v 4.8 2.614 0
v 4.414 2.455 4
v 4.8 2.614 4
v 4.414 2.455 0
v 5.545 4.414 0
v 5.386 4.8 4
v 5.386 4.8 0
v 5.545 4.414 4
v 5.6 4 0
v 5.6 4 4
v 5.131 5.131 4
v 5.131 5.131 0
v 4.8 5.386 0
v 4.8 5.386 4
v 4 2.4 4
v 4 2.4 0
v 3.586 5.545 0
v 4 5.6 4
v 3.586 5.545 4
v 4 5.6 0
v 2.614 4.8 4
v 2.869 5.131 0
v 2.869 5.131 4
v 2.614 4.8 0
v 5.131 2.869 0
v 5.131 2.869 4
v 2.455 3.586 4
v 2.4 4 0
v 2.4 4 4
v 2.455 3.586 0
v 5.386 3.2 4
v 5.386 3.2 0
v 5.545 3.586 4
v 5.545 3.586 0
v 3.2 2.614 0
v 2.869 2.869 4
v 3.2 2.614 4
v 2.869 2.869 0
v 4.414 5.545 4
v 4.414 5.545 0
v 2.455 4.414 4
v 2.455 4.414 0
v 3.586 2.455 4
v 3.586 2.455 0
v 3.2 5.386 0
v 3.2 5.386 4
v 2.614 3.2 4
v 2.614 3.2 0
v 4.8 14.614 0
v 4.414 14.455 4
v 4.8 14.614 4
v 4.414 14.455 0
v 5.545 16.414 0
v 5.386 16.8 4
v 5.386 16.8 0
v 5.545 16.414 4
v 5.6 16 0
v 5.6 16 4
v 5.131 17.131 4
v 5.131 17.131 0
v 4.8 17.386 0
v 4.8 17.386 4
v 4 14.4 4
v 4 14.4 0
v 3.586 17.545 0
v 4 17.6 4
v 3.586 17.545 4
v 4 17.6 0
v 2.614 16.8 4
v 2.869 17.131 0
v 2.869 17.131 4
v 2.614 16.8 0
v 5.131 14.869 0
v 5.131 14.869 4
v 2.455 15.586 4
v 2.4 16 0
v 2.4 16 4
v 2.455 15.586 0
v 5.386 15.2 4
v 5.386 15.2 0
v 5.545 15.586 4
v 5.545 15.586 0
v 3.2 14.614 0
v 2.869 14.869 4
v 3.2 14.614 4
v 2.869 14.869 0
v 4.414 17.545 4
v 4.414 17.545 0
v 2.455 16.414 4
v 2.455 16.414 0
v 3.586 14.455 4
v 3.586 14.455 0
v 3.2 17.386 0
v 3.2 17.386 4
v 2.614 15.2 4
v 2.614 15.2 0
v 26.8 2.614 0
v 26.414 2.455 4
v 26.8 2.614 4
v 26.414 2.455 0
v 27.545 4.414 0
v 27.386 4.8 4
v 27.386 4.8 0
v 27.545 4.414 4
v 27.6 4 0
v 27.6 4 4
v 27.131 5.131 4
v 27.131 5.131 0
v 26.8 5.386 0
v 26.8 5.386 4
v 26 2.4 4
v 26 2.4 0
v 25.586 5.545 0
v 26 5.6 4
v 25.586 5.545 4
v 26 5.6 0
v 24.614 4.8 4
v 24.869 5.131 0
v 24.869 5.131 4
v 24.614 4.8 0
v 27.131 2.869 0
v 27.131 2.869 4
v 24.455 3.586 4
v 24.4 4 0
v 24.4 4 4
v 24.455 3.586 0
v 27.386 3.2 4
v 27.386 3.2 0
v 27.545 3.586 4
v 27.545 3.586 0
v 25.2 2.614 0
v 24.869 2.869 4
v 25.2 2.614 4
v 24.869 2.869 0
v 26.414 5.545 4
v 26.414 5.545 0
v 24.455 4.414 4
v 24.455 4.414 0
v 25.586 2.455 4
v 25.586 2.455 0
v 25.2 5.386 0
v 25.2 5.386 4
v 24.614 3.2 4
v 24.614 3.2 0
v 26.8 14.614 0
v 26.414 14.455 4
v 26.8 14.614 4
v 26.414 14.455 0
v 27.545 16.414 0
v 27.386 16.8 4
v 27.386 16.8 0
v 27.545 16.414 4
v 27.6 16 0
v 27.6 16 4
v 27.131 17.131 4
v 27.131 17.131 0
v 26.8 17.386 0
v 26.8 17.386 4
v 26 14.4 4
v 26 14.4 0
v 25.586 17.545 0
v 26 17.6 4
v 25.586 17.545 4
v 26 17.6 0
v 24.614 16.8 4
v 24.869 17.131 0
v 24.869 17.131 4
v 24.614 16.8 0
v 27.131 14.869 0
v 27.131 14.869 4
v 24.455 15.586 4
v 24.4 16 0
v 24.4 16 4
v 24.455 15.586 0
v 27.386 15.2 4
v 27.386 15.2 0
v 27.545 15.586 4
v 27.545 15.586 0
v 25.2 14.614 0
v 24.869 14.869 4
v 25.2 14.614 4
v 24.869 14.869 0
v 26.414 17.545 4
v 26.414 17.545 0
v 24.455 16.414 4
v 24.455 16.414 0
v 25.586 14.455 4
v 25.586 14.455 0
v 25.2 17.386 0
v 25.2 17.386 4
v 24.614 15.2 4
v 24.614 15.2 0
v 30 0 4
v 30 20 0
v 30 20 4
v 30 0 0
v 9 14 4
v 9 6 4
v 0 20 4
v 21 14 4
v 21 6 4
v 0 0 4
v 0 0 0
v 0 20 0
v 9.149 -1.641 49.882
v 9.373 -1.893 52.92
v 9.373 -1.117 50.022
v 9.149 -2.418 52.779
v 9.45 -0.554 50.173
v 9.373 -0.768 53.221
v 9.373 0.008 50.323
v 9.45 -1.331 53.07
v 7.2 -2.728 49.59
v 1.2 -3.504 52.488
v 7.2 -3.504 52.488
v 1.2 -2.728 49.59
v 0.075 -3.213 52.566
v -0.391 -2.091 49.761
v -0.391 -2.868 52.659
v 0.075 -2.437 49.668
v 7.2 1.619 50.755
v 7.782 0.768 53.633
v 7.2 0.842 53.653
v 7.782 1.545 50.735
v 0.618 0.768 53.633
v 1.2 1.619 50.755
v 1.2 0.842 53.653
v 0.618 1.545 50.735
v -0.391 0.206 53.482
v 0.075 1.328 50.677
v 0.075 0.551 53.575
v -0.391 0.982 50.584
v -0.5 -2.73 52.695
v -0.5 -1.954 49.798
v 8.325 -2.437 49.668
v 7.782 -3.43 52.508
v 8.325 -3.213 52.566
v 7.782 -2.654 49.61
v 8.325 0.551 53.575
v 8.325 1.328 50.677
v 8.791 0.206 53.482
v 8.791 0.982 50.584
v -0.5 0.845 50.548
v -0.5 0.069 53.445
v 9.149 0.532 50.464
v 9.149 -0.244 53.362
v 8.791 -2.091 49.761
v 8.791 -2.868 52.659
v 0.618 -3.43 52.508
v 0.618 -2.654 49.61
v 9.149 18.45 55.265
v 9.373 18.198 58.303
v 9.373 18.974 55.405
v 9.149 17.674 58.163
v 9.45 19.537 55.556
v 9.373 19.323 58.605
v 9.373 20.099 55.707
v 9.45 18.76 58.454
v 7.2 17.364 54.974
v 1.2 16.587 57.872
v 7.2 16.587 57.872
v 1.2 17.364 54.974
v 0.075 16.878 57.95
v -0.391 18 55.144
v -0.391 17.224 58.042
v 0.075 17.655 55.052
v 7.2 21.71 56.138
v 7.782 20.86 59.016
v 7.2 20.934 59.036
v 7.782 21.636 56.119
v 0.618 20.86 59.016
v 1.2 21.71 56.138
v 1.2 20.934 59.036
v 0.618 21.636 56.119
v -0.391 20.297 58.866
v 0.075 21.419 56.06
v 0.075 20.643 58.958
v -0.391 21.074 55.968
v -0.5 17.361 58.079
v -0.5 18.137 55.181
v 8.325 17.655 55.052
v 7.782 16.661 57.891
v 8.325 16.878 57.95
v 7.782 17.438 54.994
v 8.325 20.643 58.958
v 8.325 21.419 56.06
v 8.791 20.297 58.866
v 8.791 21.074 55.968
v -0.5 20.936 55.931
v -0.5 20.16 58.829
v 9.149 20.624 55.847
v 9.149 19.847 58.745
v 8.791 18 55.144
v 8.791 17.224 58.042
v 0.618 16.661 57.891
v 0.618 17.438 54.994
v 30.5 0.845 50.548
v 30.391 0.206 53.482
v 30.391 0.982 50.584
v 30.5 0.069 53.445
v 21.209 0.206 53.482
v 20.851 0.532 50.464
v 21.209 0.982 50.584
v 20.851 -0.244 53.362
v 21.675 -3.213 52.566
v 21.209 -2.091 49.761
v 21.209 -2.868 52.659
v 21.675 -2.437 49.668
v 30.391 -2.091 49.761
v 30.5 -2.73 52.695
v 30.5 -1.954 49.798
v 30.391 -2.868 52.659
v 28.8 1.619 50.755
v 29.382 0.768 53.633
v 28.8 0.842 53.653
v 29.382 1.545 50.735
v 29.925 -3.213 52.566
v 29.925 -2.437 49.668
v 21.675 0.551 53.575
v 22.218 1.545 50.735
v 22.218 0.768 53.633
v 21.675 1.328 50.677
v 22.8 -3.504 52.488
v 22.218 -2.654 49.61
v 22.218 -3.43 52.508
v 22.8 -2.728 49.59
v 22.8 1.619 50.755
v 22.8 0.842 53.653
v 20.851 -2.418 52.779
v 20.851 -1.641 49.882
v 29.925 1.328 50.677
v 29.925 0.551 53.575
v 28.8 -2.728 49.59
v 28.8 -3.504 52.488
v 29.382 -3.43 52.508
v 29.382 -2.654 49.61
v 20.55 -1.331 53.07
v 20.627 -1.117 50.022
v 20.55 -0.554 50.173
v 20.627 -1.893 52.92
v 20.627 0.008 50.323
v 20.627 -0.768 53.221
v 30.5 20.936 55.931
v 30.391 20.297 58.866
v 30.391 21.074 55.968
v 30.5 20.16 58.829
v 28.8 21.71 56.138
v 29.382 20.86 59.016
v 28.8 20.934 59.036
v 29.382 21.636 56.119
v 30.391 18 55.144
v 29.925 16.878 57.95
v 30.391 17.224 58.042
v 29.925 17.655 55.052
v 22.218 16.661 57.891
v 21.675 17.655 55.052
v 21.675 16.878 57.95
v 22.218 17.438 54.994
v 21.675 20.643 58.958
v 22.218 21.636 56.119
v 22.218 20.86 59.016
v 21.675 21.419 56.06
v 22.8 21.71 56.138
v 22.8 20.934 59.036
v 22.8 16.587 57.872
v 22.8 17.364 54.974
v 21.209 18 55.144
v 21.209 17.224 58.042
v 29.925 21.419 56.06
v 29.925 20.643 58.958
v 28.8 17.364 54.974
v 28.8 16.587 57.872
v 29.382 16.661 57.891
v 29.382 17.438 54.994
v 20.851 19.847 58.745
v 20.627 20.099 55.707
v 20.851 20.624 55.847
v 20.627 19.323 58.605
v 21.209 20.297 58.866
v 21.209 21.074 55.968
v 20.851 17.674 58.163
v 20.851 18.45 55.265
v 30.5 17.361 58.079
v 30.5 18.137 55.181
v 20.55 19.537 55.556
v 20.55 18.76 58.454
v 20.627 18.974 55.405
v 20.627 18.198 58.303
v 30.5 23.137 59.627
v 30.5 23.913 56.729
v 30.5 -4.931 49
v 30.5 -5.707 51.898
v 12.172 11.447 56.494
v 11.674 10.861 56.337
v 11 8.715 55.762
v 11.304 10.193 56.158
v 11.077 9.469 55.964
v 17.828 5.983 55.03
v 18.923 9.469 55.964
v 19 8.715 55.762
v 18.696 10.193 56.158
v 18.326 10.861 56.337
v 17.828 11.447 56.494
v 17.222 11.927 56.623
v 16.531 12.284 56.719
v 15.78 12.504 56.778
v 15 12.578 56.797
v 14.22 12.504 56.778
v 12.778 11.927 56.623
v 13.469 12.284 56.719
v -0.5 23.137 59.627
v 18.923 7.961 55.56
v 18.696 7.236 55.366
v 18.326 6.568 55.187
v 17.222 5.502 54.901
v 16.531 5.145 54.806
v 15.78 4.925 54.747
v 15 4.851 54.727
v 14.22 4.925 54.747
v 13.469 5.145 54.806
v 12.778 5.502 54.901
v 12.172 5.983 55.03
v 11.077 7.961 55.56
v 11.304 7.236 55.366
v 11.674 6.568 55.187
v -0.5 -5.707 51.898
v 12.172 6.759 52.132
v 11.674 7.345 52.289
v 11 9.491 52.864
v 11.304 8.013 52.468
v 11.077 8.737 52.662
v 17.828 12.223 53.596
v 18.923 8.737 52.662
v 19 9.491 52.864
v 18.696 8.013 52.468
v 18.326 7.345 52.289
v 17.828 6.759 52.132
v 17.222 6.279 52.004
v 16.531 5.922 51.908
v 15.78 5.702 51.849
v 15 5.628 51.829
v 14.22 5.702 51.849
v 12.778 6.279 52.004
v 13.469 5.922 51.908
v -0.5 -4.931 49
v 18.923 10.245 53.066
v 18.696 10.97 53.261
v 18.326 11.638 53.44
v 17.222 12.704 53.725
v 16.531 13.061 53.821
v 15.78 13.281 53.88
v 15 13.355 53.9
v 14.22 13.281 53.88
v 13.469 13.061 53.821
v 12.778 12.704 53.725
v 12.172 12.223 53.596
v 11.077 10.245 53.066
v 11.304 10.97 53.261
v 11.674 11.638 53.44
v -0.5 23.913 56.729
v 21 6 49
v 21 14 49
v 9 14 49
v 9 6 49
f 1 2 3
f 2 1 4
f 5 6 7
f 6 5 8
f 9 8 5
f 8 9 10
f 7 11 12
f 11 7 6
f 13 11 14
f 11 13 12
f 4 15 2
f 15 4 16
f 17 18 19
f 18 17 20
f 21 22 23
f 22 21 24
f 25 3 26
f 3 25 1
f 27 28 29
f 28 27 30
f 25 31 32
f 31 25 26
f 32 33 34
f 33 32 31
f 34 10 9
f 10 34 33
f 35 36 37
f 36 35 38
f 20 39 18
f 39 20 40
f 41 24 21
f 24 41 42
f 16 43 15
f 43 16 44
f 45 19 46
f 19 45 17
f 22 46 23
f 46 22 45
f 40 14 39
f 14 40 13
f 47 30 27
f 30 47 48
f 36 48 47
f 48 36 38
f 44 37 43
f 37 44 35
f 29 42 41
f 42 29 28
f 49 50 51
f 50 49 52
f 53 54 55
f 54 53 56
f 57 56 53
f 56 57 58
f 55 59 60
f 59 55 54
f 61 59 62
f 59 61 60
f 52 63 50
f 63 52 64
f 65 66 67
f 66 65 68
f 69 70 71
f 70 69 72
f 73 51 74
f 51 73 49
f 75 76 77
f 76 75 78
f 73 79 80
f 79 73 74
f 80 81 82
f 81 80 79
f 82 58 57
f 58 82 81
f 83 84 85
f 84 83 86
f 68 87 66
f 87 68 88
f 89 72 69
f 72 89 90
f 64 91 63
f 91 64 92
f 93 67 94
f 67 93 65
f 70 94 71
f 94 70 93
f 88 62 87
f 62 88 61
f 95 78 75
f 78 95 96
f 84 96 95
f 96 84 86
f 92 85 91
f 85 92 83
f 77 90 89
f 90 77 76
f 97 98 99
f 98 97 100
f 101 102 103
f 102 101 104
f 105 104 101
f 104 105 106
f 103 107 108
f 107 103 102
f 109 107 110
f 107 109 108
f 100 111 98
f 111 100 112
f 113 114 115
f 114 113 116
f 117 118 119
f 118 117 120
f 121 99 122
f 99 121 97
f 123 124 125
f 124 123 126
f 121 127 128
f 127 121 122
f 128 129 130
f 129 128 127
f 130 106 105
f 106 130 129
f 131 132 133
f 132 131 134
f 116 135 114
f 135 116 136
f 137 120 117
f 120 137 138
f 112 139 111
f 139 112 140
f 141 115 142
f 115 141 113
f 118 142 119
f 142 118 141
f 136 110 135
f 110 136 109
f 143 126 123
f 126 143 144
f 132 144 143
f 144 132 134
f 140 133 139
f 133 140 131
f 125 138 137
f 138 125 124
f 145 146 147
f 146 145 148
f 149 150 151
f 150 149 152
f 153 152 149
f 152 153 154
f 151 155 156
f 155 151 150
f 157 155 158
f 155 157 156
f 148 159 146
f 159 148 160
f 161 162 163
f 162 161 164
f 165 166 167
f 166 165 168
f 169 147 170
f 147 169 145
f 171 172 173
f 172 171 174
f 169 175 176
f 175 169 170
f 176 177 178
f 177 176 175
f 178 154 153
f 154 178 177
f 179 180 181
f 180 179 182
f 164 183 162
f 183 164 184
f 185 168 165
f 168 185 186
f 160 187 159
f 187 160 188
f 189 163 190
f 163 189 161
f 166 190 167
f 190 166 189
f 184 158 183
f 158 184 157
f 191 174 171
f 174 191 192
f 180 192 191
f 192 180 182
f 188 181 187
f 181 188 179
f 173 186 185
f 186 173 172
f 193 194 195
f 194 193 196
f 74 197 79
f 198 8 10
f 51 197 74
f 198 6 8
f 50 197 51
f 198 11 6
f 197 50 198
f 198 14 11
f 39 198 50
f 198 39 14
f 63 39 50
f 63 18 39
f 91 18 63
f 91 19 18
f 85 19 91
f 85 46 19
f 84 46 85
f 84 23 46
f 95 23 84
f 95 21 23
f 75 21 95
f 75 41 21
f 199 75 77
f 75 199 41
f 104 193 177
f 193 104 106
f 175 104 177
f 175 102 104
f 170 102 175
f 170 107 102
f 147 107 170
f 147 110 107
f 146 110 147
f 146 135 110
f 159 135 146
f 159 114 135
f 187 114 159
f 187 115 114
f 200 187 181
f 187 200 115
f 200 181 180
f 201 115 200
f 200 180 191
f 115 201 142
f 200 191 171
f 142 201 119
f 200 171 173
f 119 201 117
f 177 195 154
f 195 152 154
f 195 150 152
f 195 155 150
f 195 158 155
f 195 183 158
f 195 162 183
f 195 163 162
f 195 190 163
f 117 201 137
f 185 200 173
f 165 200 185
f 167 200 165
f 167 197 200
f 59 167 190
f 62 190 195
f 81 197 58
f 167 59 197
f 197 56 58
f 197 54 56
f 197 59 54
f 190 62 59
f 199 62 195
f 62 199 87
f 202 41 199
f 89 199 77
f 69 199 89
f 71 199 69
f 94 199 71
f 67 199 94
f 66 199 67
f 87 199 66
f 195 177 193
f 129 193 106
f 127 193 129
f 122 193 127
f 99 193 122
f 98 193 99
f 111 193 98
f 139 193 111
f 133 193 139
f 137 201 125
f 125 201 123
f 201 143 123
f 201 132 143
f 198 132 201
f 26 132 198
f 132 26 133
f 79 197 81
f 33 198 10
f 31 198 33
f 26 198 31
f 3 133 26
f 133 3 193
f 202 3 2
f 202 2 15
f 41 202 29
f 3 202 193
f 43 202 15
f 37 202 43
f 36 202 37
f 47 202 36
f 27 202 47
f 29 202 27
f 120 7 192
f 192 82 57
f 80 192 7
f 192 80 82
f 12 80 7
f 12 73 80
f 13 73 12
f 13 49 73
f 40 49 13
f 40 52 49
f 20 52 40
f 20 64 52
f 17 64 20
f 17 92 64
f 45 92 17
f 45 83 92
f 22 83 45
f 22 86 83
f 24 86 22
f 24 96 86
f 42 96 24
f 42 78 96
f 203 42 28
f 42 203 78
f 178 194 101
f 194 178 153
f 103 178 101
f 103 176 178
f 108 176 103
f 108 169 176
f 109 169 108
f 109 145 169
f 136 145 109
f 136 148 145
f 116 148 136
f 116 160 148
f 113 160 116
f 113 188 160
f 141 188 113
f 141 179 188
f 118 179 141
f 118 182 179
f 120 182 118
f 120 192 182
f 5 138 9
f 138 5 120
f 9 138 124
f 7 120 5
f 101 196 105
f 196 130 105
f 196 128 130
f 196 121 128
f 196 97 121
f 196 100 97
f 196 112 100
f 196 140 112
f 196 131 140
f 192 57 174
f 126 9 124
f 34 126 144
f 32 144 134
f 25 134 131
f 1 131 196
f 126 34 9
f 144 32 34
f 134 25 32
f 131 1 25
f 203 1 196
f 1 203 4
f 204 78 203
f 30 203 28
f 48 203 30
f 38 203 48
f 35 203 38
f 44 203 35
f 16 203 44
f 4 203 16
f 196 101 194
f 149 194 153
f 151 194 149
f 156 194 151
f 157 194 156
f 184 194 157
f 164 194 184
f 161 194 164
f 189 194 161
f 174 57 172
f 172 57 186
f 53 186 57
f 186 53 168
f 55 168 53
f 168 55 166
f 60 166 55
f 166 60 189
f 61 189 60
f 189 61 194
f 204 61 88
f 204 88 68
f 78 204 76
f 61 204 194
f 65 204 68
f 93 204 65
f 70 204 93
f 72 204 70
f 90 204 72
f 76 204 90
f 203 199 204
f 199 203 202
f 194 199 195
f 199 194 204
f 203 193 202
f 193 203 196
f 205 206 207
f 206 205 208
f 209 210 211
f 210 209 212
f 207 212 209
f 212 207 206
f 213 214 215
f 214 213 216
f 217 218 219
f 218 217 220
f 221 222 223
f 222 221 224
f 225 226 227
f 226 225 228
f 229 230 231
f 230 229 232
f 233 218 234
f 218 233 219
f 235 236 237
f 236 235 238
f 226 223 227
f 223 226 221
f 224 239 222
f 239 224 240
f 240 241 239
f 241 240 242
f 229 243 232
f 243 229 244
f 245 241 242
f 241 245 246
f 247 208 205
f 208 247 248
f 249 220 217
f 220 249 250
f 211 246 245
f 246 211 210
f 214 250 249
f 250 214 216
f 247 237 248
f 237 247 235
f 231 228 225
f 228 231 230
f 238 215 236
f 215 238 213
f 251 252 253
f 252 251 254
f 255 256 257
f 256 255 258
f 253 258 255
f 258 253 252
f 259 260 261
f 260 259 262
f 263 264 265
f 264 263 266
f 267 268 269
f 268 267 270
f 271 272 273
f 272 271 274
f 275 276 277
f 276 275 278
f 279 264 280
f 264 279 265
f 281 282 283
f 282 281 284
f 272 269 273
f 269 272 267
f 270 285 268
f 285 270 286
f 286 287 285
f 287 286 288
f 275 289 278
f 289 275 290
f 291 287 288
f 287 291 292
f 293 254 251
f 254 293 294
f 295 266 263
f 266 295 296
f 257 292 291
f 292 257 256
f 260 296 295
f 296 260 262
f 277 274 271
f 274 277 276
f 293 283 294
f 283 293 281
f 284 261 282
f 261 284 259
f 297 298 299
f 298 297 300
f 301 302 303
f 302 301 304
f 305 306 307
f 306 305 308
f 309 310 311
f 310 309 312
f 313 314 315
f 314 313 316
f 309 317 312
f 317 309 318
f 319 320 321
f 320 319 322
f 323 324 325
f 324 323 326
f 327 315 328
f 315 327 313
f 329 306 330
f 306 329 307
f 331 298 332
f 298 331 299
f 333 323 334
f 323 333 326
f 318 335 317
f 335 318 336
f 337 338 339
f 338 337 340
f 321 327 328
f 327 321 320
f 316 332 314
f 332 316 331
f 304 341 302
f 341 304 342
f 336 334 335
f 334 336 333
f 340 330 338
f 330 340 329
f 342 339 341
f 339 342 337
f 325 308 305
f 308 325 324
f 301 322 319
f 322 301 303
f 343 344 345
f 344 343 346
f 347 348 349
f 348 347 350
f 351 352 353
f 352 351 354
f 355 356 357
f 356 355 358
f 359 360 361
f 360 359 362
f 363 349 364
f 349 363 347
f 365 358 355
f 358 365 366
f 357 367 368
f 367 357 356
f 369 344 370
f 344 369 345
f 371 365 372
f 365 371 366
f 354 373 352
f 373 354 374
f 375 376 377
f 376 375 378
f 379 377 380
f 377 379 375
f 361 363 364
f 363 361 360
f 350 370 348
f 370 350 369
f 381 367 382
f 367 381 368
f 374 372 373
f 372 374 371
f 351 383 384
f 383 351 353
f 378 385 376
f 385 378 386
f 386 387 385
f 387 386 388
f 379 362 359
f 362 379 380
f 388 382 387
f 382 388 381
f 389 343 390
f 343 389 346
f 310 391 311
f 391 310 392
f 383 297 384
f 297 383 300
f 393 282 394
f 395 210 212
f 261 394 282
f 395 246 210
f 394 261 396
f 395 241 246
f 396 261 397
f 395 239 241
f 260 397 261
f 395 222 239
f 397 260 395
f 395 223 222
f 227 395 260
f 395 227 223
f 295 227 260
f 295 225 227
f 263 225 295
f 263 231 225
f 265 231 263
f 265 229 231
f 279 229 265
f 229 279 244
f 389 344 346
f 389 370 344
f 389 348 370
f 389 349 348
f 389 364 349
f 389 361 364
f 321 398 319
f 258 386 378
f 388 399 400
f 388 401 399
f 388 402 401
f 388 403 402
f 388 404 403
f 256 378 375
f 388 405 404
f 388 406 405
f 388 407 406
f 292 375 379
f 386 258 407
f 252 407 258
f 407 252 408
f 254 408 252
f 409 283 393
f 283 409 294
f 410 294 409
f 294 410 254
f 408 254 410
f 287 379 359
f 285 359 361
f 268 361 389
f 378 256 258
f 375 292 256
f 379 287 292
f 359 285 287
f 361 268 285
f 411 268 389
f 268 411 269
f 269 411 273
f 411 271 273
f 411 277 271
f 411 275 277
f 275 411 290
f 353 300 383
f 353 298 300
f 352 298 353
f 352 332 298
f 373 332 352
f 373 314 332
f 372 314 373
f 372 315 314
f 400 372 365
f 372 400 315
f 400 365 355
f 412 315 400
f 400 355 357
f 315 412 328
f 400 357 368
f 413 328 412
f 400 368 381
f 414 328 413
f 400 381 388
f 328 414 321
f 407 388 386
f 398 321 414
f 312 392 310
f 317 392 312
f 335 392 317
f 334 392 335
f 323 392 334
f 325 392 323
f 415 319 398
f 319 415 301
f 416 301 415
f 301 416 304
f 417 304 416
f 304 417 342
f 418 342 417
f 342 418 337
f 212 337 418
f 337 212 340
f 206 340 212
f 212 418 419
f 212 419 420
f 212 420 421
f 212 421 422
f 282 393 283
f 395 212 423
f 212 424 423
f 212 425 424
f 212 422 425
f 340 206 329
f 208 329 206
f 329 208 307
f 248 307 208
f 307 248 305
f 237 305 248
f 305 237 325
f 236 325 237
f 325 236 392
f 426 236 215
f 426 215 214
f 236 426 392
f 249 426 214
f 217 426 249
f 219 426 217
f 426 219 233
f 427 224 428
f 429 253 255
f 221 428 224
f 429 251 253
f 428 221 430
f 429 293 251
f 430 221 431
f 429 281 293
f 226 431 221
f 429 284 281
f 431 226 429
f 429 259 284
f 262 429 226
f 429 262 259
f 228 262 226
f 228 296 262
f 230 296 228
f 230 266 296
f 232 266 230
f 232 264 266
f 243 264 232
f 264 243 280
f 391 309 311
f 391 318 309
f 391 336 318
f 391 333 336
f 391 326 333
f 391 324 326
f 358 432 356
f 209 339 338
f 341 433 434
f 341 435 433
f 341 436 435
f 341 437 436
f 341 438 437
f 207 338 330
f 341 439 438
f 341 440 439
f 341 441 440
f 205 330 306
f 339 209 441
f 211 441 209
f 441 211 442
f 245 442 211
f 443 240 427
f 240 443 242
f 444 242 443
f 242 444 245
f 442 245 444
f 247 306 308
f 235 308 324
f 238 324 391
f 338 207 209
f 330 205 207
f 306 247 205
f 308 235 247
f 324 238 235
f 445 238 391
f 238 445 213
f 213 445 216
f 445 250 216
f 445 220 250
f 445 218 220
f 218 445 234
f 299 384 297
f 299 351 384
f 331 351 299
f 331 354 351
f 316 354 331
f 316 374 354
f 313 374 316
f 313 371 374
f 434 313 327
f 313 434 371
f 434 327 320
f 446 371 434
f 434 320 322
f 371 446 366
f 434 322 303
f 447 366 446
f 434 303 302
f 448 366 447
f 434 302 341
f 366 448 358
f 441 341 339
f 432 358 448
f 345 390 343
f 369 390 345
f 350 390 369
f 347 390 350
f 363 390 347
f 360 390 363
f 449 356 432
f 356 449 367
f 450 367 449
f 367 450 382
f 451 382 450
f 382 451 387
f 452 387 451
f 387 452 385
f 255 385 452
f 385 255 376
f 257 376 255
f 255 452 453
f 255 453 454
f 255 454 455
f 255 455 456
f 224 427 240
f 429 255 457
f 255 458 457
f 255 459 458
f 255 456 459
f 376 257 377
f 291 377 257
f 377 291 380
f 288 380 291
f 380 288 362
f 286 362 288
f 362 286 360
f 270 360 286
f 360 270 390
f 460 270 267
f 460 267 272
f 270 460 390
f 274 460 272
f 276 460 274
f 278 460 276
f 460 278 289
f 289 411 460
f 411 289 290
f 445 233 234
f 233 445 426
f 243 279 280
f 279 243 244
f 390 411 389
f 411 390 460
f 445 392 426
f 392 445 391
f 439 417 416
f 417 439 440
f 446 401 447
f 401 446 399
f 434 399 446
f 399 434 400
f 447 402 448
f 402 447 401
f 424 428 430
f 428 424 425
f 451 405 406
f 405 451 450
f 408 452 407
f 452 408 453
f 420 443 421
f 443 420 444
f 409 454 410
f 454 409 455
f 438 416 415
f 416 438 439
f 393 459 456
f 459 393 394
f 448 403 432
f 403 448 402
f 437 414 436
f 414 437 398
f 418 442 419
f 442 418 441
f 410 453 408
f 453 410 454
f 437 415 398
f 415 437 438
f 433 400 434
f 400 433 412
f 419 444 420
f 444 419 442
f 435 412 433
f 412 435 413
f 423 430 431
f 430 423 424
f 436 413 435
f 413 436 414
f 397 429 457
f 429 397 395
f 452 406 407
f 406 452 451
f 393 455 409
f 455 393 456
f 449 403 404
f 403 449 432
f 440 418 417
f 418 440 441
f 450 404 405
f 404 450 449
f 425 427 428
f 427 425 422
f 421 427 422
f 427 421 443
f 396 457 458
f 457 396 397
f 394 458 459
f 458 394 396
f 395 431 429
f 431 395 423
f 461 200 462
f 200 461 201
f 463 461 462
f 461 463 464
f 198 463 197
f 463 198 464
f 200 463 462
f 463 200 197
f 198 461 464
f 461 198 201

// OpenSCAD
/*
 * Camera mount for Raspberry Pi Camera Module 3, for the NITROUS chassis
 * (models/Print-01_DKS-Pro_DukeDoks_Main-body_One-piece-Body).
 *
 * The original NITROUS model has no camera bracket at all -- the author
 * built it as a manual RC car with a custom ESP32 board, no camera. This
 * is a fresh design, not adapted from any external source.
 *
 * Camera board dimensions and hole pattern are read directly from the
 * official Raspberry Pi mechanical drawing (see doc comment below), not
 * guessed. Because reading exact hole-to-hole pitch off a technical PDF
 * without the physical board in hand carries some risk of a small error,
 * this design uses SLOTS instead of tight-fit holes for the camera board
 * mounting screws -- a few mm of horizontal slack means a misread pitch of
 * 1-2mm won't make the part useless, whereas a precise round hole would.
 *
 * Source of dimensions: official Raspberry Pi Camera Module 3 Standard
 * mechanical drawing, https://datasheets.raspberrypi.com/camera/camera-module-3-standard-mechanical-drawing.pdf
 * Board envelope: 25 x 23.862mm. Mounting holes: 4x diameter 2.2mm on
 * ~21.6mm x ~20.8mm pitch (read off the drawing; verify against your
 * physical unit before drilling any TIGHT-fit hole pattern -- the slots
 * below are deliberately oversized for this reason).
 *
 * STATUS: NOT COMPILED. No OpenSCAD installation was available in this
 * environment (chocolatey install failed on a permissions/lock error, and
 * installing software system-wide without confirmation felt like the
 * wrong call for a throwaway CAD check). Written carefully with only
 * basic primitives (cube/cylinder/translate/rotate/difference/union) that
 * are unlikely to have syntax errors, but treat this as a first draft:
 * OPEN IT IN OPENSCAD AND VISUALLY CHECK BEFORE SLICING/PRINTING.
 * See roadmap issue #3.
 */

// ---- Parameters (all mm) ----

// Camera board (official RPi Camera Module 3 drawing)
cam_board_x = 25;
cam_board_y = 23.862;
cam_board_thickness = 1.5;     // PCB thickness, approximate
cam_hole_dia = 2.2;            // mounting hole diameter on the board
cam_slot_width = 4.5;          // oversized slot width for tolerance
cam_slot_length = 6;           // slot length (horizontal play)
cam_hole_pitch_x = 21.6;       // approx horizontal hole-to-hole spacing
cam_hole_pitch_y = 20.8;       // approx vertical hole-to-hole spacing
cam_lens_hole_dia = 8;         // clearance hole behind the lens (>5.75mm pad)

// Mounting post (attaches to the chassis top, e.g. near
// Print-10_Central-Axis or Print-11_Bridge -- the tallest existing part
// is 61mm, this post is deliberately independent of that so it can be
// glued/screwed wherever the assembled chassis has clearance)
post_height = 45;
post_width = 12;
post_depth = 8;

// Base plate that sits on the chassis and gets screwed/glued down
base_x = 30;
base_y = 20;
base_thickness = 4;
base_screw_hole_dia = 3.2;     // for M3 self-tapping screws into the chassis
base_screw_inset = 4;          // distance of screw holes from base edge

// Camera head plate, tilted down toward the track
head_tilt_deg = 15;            // downward tilt so the camera looks at the
                                // track ahead, not the horizon -- adjust
                                // once the camera is actually mounted and
                                // the perspective calibration (tools/
                                // calibrate_camera.py) shows what's needed
head_plate_thickness = 3;

module base_plate() {
    difference() {
        cube([base_x, base_y, base_thickness]);
        for (x = [base_screw_inset, base_x - base_screw_inset])
            for (y = [base_screw_inset, base_y - base_screw_inset])
                translate([x, y, -1])
                    cylinder(h = base_thickness + 2, d = base_screw_hole_dia, $fn = 24);
    }
}

module post() {
    translate([(base_x - post_width) / 2, (base_y - post_depth) / 2, base_thickness])
        cube([post_width, post_depth, post_height]);
}

module camera_head_plate() {
    difference() {
        cube([cam_board_x + 6, cam_board_y + 6, head_plate_thickness]);

        // Lens clearance hole, centered
        translate([(cam_board_x + 6) / 2, (cam_board_y + 6) / 2, -1])
            cylinder(h = head_plate_thickness + 2, d = cam_lens_hole_dia, $fn = 32);

        // Mounting slots (oversized on purpose, see header comment)
        for (dx = [-cam_hole_pitch_x / 2, cam_hole_pitch_x / 2])
            for (dy = [-cam_hole_pitch_y / 2, cam_hole_pitch_y / 2])
                translate([(cam_board_x + 6) / 2 + dx, (cam_board_y + 6) / 2 + dy, -1])
                    hull() {
                        translate([-cam_slot_length / 2, 0, 0])
                            cylinder(h = head_plate_thickness + 2, d = cam_slot_width, $fn = 24);
                        translate([cam_slot_length / 2, 0, 0])
                            cylinder(h = head_plate_thickness + 2, d = cam_slot_width, $fn = 24);
                    }
    }
}

module camera_mount_assembly() {
    base_plate();
    post();

    // Camera head plate sits on top of the post, tilted down toward the
    // track. Rotated around the X axis so the front edge (toward the
    // track) dips down by head_tilt_deg.
    translate([(base_x - (cam_board_x + 6)) / 2, (base_y - (cam_board_y + 6)) / 2,
               base_thickness + post_height])
        rotate([head_tilt_deg, 0, 0])
            camera_head_plate();
}

camera_mount_assembly();
